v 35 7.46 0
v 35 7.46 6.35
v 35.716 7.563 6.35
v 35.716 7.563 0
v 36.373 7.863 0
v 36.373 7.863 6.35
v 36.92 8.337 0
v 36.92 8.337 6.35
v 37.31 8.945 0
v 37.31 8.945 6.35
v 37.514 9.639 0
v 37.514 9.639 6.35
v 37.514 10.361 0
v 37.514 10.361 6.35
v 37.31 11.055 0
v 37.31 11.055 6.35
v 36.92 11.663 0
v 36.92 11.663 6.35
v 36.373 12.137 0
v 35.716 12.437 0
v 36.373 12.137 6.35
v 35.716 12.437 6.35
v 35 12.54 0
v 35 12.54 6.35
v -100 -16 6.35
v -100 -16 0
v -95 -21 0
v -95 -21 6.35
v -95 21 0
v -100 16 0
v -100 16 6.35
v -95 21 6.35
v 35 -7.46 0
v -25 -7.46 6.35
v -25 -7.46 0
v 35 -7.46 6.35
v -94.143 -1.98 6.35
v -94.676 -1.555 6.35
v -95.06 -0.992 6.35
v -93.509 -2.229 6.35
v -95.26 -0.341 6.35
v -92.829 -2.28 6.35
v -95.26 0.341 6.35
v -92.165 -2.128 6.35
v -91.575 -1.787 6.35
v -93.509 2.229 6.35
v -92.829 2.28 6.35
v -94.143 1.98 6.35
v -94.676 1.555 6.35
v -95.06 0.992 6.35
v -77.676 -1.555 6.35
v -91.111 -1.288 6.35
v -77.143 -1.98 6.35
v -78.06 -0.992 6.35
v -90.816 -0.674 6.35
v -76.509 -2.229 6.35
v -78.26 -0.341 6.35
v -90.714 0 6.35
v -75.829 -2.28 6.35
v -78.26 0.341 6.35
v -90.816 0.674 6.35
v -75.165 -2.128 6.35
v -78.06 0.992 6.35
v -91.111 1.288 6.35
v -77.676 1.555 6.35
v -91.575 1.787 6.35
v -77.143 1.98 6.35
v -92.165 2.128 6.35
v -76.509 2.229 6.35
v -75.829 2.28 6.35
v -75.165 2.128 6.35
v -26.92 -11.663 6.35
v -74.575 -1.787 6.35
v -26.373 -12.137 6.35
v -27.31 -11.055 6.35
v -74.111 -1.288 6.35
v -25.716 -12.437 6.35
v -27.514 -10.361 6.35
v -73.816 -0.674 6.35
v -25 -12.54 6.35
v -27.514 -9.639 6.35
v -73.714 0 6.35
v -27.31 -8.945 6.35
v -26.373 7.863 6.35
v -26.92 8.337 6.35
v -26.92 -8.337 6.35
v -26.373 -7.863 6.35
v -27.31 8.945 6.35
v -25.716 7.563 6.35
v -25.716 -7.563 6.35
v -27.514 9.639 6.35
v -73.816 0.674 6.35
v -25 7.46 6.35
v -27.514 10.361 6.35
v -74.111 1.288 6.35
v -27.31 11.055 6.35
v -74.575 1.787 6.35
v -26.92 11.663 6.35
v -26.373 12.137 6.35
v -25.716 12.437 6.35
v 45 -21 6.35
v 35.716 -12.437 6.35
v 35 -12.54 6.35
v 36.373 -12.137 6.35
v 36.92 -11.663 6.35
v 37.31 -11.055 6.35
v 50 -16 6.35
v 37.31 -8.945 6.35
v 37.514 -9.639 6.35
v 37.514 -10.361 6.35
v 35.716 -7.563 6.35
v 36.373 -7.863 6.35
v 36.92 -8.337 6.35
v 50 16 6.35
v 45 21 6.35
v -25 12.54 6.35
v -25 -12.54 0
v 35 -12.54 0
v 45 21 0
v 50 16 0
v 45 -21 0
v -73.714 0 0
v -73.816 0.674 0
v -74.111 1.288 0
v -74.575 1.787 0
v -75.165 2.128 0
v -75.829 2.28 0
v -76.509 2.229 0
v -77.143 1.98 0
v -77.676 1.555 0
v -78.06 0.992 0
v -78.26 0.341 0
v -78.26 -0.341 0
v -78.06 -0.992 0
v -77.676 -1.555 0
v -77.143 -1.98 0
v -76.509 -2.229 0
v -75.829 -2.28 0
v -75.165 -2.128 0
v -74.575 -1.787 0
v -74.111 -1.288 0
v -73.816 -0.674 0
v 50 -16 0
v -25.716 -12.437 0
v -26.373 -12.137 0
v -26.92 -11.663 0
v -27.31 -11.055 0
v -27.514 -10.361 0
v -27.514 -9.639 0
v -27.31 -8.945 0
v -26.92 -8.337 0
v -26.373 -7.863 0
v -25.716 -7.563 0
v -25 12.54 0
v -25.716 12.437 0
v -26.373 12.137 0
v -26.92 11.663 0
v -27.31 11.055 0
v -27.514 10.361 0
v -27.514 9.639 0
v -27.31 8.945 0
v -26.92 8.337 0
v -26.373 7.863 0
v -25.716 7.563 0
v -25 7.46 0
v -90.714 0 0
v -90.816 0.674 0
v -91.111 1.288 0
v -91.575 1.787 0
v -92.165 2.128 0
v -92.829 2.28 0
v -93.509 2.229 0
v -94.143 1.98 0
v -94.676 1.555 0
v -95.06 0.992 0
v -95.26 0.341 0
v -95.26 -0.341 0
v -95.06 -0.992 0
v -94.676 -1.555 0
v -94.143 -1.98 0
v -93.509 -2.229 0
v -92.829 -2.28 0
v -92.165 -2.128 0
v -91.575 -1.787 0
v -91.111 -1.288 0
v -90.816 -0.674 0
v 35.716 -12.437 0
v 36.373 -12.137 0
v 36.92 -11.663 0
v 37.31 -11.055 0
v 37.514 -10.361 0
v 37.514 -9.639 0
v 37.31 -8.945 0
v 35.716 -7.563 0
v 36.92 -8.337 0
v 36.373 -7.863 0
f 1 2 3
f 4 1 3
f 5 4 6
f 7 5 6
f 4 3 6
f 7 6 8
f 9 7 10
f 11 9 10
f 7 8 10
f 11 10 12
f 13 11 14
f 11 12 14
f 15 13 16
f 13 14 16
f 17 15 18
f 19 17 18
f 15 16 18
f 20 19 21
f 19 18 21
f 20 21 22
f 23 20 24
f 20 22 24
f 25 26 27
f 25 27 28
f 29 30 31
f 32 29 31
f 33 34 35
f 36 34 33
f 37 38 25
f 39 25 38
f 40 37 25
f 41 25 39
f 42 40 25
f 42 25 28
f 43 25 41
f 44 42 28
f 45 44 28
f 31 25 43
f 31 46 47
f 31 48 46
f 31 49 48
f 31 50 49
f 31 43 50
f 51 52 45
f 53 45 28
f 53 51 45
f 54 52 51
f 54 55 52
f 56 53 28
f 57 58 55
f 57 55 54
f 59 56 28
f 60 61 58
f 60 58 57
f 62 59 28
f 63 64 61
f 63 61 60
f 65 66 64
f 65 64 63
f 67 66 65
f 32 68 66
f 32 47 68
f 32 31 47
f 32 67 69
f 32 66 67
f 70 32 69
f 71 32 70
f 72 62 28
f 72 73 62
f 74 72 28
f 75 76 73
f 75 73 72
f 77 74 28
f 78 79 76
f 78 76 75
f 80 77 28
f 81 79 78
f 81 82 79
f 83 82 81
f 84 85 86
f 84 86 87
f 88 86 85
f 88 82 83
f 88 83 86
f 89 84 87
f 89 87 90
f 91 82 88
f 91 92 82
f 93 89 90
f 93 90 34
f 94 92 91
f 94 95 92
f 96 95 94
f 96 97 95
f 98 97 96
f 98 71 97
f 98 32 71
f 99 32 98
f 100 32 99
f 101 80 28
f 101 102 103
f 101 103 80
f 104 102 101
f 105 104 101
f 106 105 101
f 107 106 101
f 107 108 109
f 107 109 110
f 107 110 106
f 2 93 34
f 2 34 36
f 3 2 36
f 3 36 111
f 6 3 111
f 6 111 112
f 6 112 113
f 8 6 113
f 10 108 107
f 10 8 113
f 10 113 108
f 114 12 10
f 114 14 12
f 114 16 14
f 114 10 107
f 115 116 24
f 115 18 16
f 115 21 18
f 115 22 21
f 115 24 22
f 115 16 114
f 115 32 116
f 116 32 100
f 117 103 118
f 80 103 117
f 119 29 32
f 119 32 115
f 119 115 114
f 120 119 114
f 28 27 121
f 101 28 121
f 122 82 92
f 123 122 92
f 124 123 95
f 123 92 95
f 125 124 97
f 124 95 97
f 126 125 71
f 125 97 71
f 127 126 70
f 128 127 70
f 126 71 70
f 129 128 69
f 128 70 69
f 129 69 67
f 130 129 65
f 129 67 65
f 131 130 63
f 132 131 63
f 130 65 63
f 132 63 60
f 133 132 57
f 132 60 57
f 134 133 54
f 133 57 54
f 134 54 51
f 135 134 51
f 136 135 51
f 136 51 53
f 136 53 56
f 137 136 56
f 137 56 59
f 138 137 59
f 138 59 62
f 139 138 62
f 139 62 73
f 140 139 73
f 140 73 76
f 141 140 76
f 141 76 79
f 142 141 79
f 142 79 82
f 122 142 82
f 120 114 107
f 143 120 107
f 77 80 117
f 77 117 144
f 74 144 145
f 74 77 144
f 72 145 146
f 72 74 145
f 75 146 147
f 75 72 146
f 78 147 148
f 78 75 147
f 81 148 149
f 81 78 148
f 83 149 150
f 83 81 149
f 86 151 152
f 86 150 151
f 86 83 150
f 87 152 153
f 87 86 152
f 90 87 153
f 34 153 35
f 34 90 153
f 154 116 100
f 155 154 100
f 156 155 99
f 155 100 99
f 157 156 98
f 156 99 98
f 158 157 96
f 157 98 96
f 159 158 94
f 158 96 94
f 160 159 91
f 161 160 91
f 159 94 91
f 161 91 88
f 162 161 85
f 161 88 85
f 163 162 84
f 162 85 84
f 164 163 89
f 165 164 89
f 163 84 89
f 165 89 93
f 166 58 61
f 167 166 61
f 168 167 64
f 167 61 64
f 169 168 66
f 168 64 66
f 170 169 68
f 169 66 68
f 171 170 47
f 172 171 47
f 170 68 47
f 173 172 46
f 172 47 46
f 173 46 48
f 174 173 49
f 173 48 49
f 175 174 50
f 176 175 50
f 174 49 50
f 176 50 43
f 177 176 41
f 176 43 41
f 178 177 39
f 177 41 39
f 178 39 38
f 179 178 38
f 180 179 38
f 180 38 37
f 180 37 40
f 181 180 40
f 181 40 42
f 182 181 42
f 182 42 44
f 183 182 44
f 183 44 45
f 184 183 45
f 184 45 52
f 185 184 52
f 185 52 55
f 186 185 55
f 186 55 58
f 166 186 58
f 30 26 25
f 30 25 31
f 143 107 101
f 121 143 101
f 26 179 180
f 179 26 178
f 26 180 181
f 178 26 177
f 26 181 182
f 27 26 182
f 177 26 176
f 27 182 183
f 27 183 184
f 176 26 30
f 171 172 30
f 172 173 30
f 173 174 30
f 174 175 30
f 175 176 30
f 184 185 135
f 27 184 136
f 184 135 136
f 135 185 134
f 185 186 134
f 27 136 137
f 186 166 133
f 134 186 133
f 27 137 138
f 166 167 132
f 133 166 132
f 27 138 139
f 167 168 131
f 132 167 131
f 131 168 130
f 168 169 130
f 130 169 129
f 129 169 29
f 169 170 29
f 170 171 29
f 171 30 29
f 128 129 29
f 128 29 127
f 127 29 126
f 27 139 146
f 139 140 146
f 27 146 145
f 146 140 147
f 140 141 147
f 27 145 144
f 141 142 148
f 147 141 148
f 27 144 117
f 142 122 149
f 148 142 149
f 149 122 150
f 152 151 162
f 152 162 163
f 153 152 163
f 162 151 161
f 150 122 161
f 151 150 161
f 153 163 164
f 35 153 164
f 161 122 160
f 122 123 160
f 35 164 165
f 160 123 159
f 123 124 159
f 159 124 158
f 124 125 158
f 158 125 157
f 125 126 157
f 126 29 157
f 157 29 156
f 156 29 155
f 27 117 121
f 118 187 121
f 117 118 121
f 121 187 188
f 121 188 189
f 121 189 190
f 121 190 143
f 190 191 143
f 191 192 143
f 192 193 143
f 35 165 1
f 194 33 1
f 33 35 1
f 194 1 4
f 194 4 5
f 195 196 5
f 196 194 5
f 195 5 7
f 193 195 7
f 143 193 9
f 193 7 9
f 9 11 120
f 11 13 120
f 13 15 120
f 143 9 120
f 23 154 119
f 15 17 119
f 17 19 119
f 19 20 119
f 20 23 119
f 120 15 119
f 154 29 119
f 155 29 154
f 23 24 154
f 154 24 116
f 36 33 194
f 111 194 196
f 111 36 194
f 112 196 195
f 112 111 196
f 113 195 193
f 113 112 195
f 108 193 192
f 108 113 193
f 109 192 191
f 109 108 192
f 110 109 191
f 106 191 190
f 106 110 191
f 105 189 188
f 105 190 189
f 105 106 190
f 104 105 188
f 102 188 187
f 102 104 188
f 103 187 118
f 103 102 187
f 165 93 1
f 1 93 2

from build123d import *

# Parameters (mm, degrees)
SKETCH1_W           = 200
SKETCH1_H           = 42
BOSS_EXTRUDE1_DEPTH = 6.35
SKETCH4_R           = 2.286
CUT_EXTRUDE3_DEPTH  = 7.35
CHAMFER1_SIZE       = 5
SKETCH9_R           = 2.286
CUT_EXTRUDE8_DEPTH  = 7.35
SKETCH12_R          = 2.286
CUT_EXTRUDE11_DEPTH = 7.35
SKETCH13_R          = 2.286
CUT_EXTRUDE12_DEPTH = 10


with BuildPart() as part:
    # Sketch1 → Boss-Extrude1 (new body)
    with BuildSketch(Plane.XY):
        Rectangle(SKETCH1_W, SKETCH1_H)
    extrude(amount=BOSS_EXTRUDE1_DEPTH)

    # Sketch4 → Cut-Extrude3 (cut, through all)
    with BuildSketch(Plane.XY.offset(6.35)):
        with Locations((-76, 0)):
            Circle(SKETCH4_R)
    extrude(amount=-CUT_EXTRUDE3_DEPTH, mode=Mode.SUBTRACT)

    # Chamfer1
    chamfer1_edges = [part.edges().sort_by_distance(p)[0] for p in [
        (100, -21, 3.175),
        (-100, -21, 3.175),
        (-100, 21, 3.175),
        (100, 21, 3.175),
    ]]
    chamfer(chamfer1_edges, length=CHAMFER1_SIZE)

    # Sketch9 → Cut-Extrude8 (cut, through all)
    with BuildSketch(Plane.XY.offset(6.35)):
        with Locations((80, 0)):
            Circle(SKETCH9_R)
    extrude(amount=-CUT_EXTRUDE8_DEPTH, mode=Mode.SUBTRACT)

    # Sketch12 → Cut-Extrude11 (cut, through all)
    with BuildSketch(Plane.XY.offset(6.35)):
        with Locations((-93, 0)):
            Circle(SKETCH12_R)
    extrude(amount=-CUT_EXTRUDE11_DEPTH, mode=Mode.SUBTRACT)

    # Sketch13 → Cut-Extrude12 (cut)
    with BuildSketch(Plane.XY.offset(6.35)):
        Polygon((45, 21), (50, 16), (50, -16), (45, -21), (95, -21), (100, -16), (100, 16), (95, 21), align=None)
        with Locations((80, 0)):
            Circle(SKETCH13_R, mode=Mode.SUBTRACT)
        with BuildLine():
            ThreePointArc((35, -7.46), (37.54, -10), (35, -12.54))
            Line((35, -12.54), (-25, -12.54))
            ThreePointArc((-25, -12.54), (-27.54, -10), (-25, -7.46))
            Line((-25, -7.46), (35, -7.46))
        make_face()
        with BuildLine():
            Line((-25, 7.46), (35, 7.46))
            ThreePointArc((35, 7.46), (37.54, 10), (35, 12.54))
            Line((35, 12.54), (-25, 12.54))
            ThreePointArc((-25, 12.54), (-27.54, 10), (-25, 7.46))
        make_face()
    extrude(amount=-CUT_EXTRUDE12_DEPTH, mode=Mode.SUBTRACT)


solid = part.part
